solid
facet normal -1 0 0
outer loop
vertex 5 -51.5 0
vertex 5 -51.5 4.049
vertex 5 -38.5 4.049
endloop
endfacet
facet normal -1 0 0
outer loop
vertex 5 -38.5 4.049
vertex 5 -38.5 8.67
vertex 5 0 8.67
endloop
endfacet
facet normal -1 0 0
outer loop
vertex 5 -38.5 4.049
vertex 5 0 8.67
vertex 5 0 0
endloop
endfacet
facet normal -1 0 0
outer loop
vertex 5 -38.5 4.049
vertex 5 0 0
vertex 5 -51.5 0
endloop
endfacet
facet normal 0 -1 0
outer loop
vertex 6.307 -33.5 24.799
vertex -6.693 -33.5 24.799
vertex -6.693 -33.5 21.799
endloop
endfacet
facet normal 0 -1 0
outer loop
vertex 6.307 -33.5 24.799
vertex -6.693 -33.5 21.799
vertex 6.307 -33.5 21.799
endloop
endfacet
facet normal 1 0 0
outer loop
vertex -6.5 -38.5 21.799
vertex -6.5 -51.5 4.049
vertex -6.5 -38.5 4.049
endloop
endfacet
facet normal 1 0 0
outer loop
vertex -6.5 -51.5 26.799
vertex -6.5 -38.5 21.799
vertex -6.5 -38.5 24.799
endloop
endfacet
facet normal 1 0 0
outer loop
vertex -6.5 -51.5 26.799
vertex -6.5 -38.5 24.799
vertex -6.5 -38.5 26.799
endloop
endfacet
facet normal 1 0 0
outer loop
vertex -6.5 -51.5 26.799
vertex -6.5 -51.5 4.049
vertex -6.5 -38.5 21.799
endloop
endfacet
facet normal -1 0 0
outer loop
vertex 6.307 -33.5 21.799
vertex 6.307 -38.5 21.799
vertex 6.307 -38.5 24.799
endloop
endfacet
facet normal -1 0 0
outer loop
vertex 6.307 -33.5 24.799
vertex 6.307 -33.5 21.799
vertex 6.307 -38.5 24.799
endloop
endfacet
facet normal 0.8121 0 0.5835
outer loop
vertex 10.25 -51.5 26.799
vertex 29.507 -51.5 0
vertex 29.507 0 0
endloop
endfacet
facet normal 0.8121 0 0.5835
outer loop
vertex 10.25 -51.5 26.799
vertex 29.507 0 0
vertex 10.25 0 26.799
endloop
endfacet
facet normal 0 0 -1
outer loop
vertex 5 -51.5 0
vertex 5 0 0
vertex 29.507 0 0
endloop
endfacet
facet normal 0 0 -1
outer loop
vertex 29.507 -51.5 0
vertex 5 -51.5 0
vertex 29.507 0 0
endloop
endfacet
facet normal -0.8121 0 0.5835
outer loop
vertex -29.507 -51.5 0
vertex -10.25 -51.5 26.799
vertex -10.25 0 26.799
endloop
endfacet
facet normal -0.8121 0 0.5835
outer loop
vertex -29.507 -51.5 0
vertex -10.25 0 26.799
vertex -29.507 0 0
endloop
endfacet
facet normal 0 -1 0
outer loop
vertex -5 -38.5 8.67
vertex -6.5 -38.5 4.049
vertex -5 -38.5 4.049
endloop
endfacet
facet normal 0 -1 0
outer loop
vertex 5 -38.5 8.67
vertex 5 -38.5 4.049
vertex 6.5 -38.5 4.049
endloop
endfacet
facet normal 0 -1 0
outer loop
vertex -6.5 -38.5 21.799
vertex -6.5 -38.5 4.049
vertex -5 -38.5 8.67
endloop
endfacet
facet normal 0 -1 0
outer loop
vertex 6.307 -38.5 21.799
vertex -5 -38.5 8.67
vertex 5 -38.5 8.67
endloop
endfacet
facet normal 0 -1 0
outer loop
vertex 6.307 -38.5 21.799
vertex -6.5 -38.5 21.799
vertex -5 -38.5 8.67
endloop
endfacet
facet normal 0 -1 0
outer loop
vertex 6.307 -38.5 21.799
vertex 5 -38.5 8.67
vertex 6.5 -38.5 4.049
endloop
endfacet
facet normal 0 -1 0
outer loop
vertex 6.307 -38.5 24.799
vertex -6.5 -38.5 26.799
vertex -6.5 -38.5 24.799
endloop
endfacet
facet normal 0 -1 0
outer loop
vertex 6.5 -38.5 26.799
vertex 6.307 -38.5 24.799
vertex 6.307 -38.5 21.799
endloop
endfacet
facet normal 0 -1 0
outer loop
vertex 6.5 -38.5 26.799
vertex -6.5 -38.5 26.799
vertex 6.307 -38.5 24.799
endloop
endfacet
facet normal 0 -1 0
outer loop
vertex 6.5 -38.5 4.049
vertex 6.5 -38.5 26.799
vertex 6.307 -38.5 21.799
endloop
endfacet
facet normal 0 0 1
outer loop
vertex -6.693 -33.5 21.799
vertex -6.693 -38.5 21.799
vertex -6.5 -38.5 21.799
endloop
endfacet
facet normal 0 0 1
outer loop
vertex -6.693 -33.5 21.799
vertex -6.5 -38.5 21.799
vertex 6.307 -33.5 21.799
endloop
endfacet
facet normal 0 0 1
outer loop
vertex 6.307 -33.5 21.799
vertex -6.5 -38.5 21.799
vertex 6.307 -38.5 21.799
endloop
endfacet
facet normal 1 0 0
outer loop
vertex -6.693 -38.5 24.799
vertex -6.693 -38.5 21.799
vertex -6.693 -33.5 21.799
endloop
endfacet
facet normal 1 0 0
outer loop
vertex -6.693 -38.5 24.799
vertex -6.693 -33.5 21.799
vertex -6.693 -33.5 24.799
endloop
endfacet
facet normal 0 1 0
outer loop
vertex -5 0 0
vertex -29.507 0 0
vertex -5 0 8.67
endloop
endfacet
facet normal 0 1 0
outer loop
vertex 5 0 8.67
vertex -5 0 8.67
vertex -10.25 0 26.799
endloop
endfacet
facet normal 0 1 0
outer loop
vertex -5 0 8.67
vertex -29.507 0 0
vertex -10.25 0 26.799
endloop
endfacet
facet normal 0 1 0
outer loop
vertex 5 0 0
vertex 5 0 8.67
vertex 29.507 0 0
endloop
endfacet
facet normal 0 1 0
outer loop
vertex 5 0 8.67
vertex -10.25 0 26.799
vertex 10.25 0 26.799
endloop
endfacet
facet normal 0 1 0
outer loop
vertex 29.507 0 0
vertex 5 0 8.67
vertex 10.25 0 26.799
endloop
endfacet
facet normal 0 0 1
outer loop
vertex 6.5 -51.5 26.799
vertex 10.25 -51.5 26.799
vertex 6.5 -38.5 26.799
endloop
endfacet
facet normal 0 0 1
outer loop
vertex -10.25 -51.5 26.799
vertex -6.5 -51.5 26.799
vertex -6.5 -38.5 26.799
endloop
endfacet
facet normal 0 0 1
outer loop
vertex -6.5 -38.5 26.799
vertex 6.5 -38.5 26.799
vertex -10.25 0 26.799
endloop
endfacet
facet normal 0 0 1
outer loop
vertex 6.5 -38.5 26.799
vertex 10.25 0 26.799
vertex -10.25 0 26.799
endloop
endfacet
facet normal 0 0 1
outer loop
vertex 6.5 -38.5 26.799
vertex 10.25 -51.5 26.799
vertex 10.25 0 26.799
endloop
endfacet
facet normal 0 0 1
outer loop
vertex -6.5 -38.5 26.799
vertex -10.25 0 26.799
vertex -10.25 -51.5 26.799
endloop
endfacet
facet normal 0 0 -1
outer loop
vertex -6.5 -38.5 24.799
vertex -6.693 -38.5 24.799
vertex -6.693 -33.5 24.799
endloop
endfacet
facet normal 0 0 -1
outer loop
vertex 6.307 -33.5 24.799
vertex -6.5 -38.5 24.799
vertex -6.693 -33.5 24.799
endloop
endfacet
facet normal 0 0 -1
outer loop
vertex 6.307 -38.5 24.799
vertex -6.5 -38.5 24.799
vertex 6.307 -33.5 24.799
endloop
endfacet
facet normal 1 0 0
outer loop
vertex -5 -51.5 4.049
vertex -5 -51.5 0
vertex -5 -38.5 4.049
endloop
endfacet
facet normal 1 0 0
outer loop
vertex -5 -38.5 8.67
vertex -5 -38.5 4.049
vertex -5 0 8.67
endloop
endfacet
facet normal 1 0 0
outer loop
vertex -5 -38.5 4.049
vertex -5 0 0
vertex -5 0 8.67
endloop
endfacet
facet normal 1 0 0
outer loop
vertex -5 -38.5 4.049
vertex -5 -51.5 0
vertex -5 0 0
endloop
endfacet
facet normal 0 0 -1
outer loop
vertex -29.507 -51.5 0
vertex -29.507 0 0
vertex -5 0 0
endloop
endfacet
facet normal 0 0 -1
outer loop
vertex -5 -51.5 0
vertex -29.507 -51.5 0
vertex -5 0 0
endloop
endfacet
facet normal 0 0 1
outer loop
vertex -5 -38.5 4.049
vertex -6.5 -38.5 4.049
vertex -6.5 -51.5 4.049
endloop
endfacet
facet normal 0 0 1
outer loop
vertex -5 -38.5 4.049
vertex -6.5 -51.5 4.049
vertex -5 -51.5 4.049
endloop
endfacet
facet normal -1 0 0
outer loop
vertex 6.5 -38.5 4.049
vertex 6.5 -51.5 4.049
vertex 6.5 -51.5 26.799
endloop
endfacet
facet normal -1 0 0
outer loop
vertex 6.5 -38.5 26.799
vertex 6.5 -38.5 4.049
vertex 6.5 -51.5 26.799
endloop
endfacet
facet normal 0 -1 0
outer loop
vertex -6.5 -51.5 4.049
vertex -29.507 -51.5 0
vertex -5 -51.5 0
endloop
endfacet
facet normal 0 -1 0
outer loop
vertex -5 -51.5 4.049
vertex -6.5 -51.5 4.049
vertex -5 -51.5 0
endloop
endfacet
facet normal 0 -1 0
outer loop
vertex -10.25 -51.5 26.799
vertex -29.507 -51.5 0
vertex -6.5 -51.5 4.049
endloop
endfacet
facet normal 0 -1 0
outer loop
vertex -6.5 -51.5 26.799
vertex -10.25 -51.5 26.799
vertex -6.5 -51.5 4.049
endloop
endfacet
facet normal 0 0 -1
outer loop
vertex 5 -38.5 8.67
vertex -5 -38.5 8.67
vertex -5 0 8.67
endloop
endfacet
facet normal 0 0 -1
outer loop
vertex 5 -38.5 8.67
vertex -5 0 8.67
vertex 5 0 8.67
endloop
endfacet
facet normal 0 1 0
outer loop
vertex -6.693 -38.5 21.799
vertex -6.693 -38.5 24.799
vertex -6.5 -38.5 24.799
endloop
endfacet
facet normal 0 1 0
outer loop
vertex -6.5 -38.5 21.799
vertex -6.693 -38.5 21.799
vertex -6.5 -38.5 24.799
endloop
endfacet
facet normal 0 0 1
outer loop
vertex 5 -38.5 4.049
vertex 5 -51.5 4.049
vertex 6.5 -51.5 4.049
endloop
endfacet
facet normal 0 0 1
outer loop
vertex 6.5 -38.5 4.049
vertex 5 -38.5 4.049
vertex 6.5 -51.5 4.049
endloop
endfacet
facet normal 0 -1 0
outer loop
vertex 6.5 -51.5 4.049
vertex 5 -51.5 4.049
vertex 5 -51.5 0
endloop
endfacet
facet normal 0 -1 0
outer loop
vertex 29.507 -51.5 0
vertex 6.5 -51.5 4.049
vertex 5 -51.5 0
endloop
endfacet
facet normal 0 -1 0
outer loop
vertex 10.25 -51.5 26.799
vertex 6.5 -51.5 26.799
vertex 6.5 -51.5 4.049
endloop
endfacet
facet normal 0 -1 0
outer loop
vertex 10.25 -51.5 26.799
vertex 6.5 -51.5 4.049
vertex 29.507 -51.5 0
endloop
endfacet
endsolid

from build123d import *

# Parameters (mm, degrees)
F1_DEPTH = 51.5
F2_W     = 13
F2_H     = 22.75
F3_DEPTH = 13
F4_W     = 13
F4_H     = 3
F5_DEPTH = 5


with BuildPart() as f1:
    # F0 (on Front) → F1 (new body)
    with BuildSketch(Plane.XZ):
        Polygon((5, 0), (29.50686, 0), (10.25, 26.798756), (-10.25, 26.798756), (-29.50686, 0), (-5, 0), (-5, 8.67), (5, 8.67), align=None)
    extrude(amount=F1_DEPTH)

    # F2 (on face) → F3 (cut)
    with BuildSketch(Plane.XZ.offset(51.5)):
        with Locations((0, 15.423756)):
            Rectangle(F2_W, F2_H)
    extrude(amount=-F3_DEPTH, mode=Mode.SUBTRACT)

    # F4 (on face) → F5 (cut)
    with BuildSketch(Plane.XZ.offset(38.5)):
        with Locations((-0.192779, 23.298756)):
            Rectangle(F4_W, F4_H)
    extrude(amount=-F5_DEPTH, mode=Mode.SUBTRACT)


solid = f1.part
